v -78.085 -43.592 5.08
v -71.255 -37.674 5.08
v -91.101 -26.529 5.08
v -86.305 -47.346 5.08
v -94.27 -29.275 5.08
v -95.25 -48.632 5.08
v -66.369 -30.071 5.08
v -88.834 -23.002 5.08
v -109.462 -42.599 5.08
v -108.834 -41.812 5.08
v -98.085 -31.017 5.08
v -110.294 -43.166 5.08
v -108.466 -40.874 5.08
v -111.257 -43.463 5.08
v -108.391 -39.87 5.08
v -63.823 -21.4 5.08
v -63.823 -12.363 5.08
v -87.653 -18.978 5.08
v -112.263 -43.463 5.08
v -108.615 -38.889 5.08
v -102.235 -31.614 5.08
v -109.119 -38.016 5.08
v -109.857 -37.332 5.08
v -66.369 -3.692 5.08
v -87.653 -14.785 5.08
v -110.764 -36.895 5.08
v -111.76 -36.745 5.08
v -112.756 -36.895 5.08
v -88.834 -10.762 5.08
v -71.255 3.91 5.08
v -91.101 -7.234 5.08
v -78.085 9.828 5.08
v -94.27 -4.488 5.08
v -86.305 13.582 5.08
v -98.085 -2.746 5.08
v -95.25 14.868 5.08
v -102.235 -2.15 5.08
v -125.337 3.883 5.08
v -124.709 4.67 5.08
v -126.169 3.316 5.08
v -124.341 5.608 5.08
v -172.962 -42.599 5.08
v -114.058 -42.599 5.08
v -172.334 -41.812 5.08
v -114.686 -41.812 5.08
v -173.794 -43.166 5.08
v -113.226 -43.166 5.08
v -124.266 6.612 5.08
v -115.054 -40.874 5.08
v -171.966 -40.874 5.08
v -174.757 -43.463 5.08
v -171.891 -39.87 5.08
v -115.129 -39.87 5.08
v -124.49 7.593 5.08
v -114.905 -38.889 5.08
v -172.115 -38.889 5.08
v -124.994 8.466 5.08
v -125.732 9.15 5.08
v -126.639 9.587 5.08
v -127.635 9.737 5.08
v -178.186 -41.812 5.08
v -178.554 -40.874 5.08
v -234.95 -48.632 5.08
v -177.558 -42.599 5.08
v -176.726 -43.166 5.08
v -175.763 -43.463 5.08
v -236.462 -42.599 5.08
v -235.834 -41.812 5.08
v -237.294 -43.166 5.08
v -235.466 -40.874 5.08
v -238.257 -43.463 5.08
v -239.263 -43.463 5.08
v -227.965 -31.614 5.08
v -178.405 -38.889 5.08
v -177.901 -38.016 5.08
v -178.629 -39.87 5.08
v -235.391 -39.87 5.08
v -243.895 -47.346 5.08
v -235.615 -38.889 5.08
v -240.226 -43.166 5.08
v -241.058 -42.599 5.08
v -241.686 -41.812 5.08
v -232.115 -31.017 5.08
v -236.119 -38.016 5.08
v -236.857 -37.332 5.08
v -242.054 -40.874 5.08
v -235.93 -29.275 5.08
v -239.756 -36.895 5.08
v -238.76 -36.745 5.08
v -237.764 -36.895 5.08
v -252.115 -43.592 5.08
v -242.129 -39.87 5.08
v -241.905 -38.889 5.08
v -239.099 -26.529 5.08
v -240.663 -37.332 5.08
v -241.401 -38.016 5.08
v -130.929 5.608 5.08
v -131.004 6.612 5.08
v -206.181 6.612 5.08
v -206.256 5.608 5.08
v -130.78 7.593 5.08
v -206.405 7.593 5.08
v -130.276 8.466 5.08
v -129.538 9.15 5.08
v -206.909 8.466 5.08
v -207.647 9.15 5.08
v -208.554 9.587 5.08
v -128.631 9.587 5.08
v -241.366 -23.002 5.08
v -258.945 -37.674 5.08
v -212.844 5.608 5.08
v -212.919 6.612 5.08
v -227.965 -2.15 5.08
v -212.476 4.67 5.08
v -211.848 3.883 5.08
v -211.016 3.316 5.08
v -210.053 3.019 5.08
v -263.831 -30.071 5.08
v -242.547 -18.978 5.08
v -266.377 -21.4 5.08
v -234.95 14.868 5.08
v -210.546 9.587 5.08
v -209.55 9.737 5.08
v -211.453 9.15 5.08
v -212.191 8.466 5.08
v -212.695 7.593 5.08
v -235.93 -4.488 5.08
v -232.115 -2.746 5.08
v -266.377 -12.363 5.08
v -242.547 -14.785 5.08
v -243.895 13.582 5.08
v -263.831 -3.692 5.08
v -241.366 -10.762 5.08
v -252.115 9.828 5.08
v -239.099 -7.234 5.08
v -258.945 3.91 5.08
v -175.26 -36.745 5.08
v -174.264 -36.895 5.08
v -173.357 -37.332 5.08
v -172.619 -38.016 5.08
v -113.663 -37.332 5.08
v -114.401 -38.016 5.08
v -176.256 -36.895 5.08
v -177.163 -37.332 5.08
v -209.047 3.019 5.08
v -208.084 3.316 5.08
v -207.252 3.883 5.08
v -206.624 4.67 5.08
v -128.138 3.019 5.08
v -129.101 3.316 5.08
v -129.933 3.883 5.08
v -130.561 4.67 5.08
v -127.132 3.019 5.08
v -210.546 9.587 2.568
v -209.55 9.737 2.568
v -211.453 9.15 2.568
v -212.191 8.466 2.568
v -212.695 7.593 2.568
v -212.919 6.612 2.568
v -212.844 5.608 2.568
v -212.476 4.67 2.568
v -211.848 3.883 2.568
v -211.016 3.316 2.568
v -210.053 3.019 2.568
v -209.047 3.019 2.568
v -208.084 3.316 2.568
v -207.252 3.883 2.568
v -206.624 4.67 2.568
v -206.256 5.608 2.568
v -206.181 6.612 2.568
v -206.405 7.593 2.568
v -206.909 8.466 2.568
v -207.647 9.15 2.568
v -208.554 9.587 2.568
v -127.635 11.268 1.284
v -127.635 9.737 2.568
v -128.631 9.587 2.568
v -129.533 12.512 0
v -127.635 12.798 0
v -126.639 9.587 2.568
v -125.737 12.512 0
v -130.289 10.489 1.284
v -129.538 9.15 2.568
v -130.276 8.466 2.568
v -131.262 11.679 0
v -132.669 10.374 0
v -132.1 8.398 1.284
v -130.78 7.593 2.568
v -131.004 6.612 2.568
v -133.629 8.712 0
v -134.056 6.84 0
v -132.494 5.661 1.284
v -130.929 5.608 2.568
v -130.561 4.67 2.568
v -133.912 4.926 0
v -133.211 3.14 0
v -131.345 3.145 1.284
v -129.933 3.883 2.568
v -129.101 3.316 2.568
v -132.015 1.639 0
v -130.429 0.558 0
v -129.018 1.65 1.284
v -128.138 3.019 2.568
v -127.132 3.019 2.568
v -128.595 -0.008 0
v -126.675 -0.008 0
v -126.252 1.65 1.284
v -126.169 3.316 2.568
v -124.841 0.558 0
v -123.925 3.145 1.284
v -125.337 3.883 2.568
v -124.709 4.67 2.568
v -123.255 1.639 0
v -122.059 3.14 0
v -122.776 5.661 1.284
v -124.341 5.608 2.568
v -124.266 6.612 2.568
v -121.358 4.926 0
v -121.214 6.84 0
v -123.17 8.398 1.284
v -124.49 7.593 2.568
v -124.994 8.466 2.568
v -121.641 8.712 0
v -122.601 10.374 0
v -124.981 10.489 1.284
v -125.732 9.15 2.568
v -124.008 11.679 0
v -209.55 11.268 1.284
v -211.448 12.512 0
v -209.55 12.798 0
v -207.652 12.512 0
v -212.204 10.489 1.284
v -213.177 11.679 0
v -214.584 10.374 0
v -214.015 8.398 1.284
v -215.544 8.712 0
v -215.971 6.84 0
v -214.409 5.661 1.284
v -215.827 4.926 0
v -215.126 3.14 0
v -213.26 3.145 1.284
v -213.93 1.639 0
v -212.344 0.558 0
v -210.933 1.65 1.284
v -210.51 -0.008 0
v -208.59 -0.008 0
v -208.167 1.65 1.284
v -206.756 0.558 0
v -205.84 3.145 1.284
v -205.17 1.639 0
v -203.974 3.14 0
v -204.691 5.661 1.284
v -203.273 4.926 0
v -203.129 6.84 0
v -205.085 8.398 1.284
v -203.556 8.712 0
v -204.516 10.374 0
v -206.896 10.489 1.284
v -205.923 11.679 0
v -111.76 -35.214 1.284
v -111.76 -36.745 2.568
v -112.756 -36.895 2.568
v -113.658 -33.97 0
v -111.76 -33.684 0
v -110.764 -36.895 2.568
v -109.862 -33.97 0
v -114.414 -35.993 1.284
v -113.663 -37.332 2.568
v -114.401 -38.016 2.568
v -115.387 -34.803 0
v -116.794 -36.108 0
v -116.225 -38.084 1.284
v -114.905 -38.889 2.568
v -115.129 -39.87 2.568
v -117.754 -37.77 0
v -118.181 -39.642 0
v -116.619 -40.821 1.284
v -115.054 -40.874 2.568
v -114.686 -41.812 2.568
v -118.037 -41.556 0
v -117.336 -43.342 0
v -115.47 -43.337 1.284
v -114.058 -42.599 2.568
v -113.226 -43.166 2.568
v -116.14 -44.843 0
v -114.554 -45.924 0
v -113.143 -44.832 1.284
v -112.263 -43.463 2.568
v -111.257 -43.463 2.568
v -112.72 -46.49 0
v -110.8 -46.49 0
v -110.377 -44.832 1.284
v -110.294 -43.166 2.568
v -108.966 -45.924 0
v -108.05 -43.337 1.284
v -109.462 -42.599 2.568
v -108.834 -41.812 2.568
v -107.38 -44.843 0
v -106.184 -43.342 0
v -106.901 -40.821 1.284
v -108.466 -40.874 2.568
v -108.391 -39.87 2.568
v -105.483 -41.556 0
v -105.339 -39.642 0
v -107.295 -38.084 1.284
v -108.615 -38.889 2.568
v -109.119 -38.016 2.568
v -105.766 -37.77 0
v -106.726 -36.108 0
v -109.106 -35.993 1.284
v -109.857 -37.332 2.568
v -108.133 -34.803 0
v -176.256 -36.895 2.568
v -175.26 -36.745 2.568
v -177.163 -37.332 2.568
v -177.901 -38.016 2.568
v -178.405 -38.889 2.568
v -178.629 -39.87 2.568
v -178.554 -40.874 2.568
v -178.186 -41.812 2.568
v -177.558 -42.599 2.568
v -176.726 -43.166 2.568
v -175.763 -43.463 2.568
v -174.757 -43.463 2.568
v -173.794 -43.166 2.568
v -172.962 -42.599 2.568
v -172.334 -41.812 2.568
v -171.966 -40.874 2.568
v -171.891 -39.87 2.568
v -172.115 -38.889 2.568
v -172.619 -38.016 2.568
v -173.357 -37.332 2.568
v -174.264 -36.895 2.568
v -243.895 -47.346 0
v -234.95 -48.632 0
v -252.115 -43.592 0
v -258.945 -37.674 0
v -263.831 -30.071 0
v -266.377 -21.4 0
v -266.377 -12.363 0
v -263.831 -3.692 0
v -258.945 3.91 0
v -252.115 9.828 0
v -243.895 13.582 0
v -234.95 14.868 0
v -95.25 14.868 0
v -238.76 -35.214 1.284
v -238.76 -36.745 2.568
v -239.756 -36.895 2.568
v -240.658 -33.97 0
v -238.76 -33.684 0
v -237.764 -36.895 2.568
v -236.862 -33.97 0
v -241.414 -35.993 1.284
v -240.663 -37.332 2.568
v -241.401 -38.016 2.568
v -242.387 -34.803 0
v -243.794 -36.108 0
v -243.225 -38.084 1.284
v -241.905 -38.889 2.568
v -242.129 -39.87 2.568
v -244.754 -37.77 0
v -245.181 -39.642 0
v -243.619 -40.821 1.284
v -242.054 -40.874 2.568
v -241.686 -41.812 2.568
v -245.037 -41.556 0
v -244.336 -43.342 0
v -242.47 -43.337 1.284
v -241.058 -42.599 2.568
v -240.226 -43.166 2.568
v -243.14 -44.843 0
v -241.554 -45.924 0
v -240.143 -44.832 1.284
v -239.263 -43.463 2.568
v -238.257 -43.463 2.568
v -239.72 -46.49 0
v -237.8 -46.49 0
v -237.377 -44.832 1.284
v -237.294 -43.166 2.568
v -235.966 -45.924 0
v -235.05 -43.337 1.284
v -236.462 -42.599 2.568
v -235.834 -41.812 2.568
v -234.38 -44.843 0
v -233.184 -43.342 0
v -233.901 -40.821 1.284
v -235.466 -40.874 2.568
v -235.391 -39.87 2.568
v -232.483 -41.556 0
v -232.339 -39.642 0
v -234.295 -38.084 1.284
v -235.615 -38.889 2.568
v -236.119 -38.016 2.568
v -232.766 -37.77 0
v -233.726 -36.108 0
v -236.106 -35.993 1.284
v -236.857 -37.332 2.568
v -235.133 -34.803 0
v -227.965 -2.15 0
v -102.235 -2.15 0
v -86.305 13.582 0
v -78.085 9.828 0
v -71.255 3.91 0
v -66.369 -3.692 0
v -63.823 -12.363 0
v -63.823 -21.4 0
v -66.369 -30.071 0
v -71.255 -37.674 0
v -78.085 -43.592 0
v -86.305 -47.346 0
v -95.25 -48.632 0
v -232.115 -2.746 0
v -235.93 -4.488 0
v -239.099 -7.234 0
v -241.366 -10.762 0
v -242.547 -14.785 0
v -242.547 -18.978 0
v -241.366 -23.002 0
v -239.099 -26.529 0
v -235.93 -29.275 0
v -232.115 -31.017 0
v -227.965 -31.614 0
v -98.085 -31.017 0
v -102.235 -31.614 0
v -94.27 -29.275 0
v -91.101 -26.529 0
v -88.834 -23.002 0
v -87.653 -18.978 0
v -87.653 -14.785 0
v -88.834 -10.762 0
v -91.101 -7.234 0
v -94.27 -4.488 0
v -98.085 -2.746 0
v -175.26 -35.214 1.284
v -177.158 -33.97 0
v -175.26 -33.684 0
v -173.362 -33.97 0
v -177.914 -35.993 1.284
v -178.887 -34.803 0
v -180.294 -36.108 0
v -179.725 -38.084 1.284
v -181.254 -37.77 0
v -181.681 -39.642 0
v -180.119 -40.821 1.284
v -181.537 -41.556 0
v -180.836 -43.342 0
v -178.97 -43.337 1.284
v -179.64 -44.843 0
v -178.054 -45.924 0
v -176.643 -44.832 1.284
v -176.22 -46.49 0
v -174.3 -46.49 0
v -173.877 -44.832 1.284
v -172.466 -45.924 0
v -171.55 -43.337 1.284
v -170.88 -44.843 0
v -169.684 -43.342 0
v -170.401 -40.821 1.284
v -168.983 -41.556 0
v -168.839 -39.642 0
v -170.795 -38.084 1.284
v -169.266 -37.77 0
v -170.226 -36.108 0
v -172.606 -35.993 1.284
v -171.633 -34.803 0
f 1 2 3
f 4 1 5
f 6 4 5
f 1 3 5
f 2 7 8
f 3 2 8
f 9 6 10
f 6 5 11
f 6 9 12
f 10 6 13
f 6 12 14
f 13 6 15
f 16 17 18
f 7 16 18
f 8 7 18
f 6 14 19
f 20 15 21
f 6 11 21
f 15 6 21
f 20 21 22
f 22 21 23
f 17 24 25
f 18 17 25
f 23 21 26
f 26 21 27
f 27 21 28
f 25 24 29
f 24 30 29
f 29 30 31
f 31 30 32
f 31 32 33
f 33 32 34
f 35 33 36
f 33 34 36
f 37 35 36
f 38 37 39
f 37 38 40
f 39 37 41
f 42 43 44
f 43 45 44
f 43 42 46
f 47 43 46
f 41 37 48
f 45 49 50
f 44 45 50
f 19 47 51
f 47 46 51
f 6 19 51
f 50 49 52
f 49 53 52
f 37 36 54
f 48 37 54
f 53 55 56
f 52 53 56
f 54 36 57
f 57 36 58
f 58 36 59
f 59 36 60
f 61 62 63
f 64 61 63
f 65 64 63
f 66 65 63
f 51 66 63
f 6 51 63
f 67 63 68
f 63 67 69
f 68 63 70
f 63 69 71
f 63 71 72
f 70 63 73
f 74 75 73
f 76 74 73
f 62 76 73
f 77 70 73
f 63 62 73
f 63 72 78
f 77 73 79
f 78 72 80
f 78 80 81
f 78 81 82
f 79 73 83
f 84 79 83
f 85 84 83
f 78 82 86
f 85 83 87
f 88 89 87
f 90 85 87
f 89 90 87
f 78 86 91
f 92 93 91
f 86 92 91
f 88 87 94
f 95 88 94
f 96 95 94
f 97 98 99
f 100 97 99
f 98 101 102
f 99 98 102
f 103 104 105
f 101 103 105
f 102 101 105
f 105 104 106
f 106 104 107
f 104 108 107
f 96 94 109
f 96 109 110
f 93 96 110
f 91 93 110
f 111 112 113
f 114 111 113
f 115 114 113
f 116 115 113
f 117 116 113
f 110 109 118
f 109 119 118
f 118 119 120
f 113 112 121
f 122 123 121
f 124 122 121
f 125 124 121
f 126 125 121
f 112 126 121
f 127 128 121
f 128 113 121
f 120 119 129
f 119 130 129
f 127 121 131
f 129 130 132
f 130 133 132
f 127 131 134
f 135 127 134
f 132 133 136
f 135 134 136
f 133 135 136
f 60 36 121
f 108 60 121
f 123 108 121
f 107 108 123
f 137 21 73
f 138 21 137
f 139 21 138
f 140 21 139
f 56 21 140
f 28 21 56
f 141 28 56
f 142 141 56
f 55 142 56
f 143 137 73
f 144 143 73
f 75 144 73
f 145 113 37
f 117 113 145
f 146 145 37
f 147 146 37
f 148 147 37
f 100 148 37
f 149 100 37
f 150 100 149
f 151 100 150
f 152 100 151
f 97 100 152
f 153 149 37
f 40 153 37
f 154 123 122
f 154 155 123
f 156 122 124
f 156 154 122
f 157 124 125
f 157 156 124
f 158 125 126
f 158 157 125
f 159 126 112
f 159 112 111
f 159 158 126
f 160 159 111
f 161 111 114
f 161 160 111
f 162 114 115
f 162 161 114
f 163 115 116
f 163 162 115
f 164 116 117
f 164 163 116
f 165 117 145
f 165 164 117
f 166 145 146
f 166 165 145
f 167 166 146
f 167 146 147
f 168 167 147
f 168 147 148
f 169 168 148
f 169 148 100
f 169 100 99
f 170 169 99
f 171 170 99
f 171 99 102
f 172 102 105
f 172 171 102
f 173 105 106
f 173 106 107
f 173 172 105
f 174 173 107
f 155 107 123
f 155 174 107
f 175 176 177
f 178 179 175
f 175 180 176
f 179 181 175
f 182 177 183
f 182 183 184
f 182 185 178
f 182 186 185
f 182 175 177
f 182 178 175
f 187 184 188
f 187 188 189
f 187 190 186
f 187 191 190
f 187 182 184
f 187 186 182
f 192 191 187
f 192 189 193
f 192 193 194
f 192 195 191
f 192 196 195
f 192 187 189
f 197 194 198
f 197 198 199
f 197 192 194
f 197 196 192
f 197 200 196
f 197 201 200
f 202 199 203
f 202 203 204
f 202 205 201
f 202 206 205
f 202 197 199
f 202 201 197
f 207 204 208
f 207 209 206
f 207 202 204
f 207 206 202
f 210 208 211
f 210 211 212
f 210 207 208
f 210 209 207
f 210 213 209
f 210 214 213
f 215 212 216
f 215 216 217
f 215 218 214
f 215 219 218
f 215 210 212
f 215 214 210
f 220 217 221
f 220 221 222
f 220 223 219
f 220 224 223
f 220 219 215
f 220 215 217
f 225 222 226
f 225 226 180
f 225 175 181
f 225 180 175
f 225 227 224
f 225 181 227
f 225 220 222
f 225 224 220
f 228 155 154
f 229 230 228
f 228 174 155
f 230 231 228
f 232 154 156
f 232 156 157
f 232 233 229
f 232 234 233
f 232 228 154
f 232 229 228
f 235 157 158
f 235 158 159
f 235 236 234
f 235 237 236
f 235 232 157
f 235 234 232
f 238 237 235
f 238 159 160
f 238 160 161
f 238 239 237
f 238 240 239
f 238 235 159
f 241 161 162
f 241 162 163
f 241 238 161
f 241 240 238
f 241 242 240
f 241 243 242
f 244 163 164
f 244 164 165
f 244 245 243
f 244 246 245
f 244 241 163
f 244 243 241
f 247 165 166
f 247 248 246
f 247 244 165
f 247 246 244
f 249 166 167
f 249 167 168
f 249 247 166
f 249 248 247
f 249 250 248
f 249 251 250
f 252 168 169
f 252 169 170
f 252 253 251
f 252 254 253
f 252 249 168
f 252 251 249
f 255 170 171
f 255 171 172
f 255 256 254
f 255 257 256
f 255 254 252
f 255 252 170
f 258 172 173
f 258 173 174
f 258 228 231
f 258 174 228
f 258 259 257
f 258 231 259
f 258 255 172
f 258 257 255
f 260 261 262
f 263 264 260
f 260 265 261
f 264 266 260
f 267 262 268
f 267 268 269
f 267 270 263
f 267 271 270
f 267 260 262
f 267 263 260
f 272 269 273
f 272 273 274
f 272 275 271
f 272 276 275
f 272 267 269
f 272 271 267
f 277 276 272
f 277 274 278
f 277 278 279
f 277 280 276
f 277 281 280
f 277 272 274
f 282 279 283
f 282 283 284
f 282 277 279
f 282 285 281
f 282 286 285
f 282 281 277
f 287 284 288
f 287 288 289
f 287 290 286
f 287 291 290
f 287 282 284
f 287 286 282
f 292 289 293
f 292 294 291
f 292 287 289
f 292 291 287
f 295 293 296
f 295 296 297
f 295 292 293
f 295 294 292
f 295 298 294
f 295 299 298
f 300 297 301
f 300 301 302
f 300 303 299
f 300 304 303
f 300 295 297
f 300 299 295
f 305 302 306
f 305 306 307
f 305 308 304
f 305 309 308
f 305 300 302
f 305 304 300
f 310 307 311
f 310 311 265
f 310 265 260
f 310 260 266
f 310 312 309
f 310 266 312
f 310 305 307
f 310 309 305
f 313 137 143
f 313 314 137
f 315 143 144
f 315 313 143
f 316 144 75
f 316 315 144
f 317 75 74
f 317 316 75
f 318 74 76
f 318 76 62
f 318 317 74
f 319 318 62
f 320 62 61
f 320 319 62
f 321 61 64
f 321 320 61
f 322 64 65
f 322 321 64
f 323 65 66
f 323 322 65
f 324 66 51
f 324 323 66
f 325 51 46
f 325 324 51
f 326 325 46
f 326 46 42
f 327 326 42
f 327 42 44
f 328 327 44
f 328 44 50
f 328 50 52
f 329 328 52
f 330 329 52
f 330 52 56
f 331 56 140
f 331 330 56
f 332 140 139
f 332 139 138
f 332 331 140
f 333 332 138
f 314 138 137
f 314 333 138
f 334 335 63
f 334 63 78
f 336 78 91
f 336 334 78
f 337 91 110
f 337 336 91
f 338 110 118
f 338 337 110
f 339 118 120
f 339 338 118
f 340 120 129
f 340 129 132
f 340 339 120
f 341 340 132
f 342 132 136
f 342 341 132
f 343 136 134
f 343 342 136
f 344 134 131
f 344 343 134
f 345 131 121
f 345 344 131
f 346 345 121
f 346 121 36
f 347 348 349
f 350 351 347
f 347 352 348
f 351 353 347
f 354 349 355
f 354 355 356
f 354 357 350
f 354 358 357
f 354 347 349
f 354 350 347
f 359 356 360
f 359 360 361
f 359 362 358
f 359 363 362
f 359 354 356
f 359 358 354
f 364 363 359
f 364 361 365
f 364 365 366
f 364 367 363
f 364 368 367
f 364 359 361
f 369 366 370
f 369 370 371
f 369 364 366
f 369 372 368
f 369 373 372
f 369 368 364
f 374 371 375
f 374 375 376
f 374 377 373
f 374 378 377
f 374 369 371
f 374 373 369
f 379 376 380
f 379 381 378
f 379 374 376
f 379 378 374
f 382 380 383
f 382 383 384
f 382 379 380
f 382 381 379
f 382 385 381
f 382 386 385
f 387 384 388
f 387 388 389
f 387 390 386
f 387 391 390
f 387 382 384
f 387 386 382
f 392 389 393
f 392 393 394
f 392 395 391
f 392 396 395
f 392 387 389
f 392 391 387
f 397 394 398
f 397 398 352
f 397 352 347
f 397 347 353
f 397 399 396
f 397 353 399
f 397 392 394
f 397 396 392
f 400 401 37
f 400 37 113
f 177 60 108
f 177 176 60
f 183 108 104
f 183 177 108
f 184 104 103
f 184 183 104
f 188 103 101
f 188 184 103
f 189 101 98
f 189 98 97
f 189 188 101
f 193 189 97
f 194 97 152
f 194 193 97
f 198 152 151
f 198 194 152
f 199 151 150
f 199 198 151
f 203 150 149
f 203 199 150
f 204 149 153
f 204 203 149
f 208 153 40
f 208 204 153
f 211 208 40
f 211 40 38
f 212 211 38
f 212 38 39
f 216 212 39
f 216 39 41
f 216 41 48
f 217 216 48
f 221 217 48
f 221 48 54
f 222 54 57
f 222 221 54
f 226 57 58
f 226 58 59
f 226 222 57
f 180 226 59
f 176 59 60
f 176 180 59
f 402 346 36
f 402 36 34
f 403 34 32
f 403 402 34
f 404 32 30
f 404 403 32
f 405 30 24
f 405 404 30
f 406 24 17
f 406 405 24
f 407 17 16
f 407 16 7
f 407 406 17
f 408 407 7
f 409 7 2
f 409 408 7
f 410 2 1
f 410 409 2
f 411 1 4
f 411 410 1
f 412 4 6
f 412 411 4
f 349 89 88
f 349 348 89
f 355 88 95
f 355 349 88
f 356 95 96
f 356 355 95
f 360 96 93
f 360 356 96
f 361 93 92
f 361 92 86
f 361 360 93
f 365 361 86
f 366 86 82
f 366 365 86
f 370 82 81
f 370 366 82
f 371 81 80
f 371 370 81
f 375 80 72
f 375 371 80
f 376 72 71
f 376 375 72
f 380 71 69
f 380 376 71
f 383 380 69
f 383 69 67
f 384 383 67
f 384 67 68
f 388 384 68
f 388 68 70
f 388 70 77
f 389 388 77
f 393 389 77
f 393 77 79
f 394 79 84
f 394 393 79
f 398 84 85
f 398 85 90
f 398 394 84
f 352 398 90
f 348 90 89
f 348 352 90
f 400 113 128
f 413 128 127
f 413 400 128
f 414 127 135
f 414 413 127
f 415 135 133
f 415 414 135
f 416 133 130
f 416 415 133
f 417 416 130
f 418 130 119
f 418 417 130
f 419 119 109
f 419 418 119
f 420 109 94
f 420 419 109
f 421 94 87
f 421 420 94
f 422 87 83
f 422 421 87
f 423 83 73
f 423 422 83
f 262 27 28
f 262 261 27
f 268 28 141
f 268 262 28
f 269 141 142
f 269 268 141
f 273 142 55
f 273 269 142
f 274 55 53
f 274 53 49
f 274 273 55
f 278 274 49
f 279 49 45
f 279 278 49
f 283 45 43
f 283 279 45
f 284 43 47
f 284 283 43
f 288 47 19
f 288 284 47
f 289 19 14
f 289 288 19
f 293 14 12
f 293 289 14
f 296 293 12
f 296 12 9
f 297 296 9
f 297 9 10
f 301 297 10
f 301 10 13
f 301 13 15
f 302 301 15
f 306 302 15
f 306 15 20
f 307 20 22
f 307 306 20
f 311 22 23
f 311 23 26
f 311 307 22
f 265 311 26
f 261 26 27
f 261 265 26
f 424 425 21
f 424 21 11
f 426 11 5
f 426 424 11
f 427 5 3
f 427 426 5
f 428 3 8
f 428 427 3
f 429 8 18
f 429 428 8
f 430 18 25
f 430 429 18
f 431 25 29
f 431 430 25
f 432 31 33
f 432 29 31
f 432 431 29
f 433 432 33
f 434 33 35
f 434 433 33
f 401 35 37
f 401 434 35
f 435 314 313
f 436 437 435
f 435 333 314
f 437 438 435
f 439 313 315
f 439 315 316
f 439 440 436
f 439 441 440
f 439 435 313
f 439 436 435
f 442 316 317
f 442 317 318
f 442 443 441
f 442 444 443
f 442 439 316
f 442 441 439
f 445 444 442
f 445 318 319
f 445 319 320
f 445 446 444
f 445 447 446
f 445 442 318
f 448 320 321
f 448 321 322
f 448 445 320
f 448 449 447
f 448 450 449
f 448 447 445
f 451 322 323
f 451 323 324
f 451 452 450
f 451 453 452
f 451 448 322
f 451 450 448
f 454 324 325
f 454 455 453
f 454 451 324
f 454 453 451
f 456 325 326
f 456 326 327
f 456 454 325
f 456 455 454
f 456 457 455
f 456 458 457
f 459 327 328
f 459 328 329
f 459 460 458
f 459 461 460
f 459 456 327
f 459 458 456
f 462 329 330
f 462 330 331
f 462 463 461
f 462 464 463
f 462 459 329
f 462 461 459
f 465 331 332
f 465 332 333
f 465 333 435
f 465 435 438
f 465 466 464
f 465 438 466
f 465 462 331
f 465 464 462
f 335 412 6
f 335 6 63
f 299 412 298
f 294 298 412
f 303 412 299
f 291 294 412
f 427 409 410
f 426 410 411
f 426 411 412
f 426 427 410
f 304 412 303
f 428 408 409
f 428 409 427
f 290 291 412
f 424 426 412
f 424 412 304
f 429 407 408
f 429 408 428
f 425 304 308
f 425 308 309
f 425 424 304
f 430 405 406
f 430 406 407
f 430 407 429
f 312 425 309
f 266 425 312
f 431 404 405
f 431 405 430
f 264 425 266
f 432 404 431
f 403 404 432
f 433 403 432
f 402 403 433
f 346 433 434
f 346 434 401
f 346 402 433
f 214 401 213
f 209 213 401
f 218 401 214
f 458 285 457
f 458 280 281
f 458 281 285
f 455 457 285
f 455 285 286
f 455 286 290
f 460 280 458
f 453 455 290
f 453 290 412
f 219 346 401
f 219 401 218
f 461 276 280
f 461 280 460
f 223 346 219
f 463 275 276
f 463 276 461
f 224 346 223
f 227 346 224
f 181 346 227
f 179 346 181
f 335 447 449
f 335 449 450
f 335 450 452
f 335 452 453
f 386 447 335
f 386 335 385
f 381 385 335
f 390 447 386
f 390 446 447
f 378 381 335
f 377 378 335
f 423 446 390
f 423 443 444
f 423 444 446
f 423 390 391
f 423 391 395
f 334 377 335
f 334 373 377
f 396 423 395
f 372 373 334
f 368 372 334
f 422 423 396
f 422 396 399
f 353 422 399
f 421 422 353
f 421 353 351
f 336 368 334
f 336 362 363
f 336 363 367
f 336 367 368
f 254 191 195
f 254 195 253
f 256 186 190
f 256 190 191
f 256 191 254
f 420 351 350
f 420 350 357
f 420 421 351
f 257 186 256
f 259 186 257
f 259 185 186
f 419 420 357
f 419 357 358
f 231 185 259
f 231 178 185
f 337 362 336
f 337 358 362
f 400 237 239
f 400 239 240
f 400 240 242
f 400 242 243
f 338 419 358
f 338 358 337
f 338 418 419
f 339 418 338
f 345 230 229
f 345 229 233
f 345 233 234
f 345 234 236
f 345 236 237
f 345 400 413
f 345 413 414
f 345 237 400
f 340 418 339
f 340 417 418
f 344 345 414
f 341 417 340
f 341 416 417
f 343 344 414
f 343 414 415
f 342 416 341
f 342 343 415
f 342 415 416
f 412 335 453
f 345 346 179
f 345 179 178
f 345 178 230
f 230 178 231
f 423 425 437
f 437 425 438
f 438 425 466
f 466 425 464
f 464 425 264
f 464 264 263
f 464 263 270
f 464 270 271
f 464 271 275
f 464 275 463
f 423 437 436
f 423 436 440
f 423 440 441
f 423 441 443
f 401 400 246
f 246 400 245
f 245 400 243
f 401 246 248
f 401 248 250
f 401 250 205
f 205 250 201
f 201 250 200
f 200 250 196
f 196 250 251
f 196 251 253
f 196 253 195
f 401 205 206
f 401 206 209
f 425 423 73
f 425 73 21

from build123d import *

# Parameters (mm, degrees)
BOSS_EXTRUDE2_DEPTH                            = 5.08
CUT_EXTRUDE1_DEPTH                             = 38.862
CSK_FOR_1_4_FLAT_HEAD_MACHINE_SCREW_2_COUNT    = 2
CSK_FOR_1_4_FLAT_HEAD_MACHINE_SCREW_2_PITCH    = 81.915
CSK_FOR_1_4_FLAT_HEAD_MACHINE_SCREW_3_AT_COUNT = 2
CSK_FOR_1_4_FLAT_HEAD_MACHINE_SCREW_3_AT_PITCH = 63.5


with BuildPart() as part:
    # Sketch1 → Boss-Extrude2 (new body)
    with BuildSketch(Plane.XY):
        with BuildLine():
            Line((-95.25, -48.631740263), (-234.95, -48.631740263))
            ThreePointArc((-234.95, -48.631740263), (-266.7, -16.881740263), (-234.95, 14.868259737))
            Line((-234.95, 14.868259737), (-95.25, 14.868259737))
            ThreePointArc((-95.25, 14.868259737), (-63.5, -16.881740263), (-95.25, -48.631740263))
        make_face()
    extrude(amount=BOSS_EXTRUDE2_DEPTH)

    # Sketch2 → Cut-Extrude1 (cut)
    with BuildSketch(Plane(origin=(0, 0, 0), x_dir=(-1, 0, 0), z_dir=(0, 0, -1))):
        with BuildLine():
            Line((227.965, -31.613740263), (102.235, -31.613740263))
            ThreePointArc((102.235, -31.613740263), (87.503, -16.881740263), (102.235, -2.149740263))
            Line((102.235, -2.149740263), (227.965, -2.149740263))
            ThreePointArc((227.965, -2.149740263), (242.697, -16.881740263), (227.965, -31.613740263))
        make_face()
    extrude(amount=-CUT_EXTRUDE1_DEPTH, mode=Mode.SUBTRACT)

    # Sketch8 → CSK for 1_4 Flat Head Machine Screw _100 (revolve, cut)
    with BuildSketch(Plane(origin=(-127.635, 6.359259737, 0), x_dir=(0, 1, 0), z_dir=(1, 0, 0))):
        Polygon((0, 0), (0, 5.08), (3.3782, 5.08), (3.3782, 2.568232241), (6.4389, 0), align=None)
    csk_for_1_4_flat_head_machine_screw_100 = revolve(axis=Axis((-127.635, 6.359259737, -6.35), (0, 0, 1)), mode=Mode.SUBTRACT)

    # CSK for 1_4 Flat Head Machine Screw  2: CSK for 1_4 Flat Head Machine Screw _100 ×2
    with Locations(*[(-i * CSK_FOR_1_4_FLAT_HEAD_MACHINE_SCREW_2_PITCH, 0, 0) for i in range(1, CSK_FOR_1_4_FLAT_HEAD_MACHINE_SCREW_2_COUNT)]):
        add(csk_for_1_4_flat_head_machine_screw_100, mode=Mode.SUBTRACT)

    # Sketch9 → CSK for 1_4 Flat Head Machine Screw  3 (revolve, cut)
    with BuildSketch(Plane(origin=(-111.76, -40.122740263, 0), x_dir=(0, 1, 0), z_dir=(1, 0, 0))):
        Polygon((0, 0), (0, 5.08), (3.3782, 5.08), (3.3782, 2.568232241), (6.4389, 0), align=None)
    csk_for_1_4_flat_head_machine_screw_3 = revolve(axis=Axis((-111.76, -40.122740263, -6.35), (0, 0, 1)), mode=Mode.SUBTRACT)

    # CSK for 1_4 Flat Head Machine Screw 3 at: CSK for 1_4 Flat Head Machine Screw  3 ×2
    with Locations(*[(-i * CSK_FOR_1_4_FLAT_HEAD_MACHINE_SCREW_3_AT_PITCH, 0, 0) for i in range(1, CSK_FOR_1_4_FLAT_HEAD_MACHINE_SCREW_3_AT_COUNT)]):
        add(csk_for_1_4_flat_head_machine_screw_3, mode=Mode.SUBTRACT)

    # Sketch10 → CSK for 1_4 Flat Head Machine Screw  4 (revolve, cut)
    with BuildSketch(Plane(origin=(-238.76, -40.122740263, 0), x_dir=(0, 1, 0), z_dir=(1, 0, 0))):
        Polygon((0, 0), (0, 5.08), (3.3782, 5.08), (3.3782, 2.568232241), (6.4389, 0), align=None)
    revolve(axis=Axis((-238.76, -40.122740263, -6.35), (0, 0, 1)), mode=Mode.SUBTRACT)


solid = part.part
